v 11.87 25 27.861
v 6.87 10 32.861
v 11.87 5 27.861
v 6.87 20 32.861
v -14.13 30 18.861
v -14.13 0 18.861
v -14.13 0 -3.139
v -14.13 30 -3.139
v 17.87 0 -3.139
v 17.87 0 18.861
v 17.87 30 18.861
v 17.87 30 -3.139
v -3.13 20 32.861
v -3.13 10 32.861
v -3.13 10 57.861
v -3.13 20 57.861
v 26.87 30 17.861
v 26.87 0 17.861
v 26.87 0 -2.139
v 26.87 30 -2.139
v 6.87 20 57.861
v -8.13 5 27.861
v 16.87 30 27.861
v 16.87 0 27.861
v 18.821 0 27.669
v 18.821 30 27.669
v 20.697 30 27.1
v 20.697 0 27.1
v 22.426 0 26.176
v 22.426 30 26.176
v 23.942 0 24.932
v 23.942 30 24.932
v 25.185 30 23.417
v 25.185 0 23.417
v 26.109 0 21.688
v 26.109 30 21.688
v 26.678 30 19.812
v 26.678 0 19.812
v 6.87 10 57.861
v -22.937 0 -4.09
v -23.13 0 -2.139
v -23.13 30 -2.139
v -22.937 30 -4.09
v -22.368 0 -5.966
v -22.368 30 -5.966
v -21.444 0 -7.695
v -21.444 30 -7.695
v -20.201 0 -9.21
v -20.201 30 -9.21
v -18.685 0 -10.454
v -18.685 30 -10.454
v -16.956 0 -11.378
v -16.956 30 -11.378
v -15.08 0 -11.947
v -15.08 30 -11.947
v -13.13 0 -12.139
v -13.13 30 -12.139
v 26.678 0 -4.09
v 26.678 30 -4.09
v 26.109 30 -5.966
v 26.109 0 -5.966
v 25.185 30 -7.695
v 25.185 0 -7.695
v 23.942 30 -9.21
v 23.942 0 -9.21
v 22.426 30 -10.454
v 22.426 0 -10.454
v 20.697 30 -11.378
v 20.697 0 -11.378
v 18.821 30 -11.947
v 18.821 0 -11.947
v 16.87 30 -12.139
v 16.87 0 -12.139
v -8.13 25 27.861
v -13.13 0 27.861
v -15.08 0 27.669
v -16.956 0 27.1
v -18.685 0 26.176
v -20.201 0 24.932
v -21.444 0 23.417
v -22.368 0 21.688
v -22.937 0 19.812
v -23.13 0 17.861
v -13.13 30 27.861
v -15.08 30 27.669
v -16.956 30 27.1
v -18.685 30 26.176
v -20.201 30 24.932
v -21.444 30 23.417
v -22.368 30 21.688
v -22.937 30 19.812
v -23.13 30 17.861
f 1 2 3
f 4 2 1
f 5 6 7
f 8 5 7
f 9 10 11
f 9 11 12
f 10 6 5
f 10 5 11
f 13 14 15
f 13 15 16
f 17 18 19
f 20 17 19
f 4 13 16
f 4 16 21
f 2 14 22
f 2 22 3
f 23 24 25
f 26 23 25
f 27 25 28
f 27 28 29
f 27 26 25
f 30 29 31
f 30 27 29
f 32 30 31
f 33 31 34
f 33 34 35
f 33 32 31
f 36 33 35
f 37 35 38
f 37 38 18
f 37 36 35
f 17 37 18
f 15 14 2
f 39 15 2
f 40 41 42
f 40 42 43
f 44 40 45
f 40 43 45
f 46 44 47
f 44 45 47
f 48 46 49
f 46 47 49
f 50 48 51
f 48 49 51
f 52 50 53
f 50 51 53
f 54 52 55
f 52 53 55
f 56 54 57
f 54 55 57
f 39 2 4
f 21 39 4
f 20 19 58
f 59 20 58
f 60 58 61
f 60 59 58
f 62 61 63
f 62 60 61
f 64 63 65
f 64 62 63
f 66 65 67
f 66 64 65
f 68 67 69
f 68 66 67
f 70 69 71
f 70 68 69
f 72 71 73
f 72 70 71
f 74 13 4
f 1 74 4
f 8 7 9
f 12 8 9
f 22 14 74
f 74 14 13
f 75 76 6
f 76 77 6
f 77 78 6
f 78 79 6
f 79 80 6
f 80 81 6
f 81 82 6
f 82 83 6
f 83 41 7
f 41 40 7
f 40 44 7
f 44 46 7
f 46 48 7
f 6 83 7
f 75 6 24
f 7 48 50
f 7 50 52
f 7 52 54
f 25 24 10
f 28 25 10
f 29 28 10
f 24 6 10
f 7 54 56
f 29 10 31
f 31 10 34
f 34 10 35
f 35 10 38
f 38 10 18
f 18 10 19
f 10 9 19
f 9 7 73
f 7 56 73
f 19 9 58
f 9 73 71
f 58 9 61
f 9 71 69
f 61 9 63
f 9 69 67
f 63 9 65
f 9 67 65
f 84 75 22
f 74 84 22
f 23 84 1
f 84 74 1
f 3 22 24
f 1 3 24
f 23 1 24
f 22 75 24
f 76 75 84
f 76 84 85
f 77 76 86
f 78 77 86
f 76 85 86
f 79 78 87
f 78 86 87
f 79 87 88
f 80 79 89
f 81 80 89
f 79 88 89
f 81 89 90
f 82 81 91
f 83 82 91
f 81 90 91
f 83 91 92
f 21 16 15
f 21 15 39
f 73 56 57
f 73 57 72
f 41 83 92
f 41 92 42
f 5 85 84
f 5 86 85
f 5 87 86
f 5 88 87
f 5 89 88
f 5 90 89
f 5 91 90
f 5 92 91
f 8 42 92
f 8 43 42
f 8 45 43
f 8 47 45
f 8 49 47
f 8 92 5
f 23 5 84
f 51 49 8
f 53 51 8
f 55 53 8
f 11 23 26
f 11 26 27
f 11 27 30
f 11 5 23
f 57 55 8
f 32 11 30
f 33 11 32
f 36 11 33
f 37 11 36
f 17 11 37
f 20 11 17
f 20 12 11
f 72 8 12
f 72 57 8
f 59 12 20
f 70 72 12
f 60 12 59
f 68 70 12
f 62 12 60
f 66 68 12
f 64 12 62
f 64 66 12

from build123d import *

# Parameters (mm, degrees)
SKETCH1_W           = 50
SKETCH1_H           = 40
SKETCH1_W_2         = 32
SKETCH1_H_2         = 22
BOSS_EXTRUDE1_DEPTH = 30
SKETCH2_W           = 10
SKETCH2_H           = 10
BOSS_EXTRUDE2_DEPTH = 30
CHAMFER1_SIZE       = 5
FILLET1_R           = 10


with BuildPart() as part:
    # Sketch1 → Boss-Extrude1 (new body)
    with BuildSketch(Plane(origin=(0, 0, 0), x_dir=(1, 0, 0), z_dir=(0, 1, 0))):
        with Locations((1.8704784, -7.860892388)):
            Rectangle(SKETCH1_W, SKETCH1_H)
        with Locations((1.8704784, -7.860892388)):
            Rectangle(SKETCH1_W_2, SKETCH1_H_2, mode=Mode.SUBTRACT)
    extrude(amount=BOSS_EXTRUDE1_DEPTH)

    # Sketch2 → Boss-Extrude2 (add)
    with BuildSketch(Plane.XY.offset(27.860892388)):
        with Locations((1.8704784, 15)):
            Rectangle(SKETCH2_W, SKETCH2_H)
    extrude(amount=BOSS_EXTRUDE2_DEPTH)

    # Chamfer1
    chamfer1_edges = [part.edges().sort_by_distance(p)[0] for p in [
        (1.8704784, 10, 27.860892388),
        (6.8704784, 15, 27.860892388),
        (-3.1295216, 15, 27.860892388),
        (1.8704784, 20, 27.860892388),
    ]]
    chamfer(chamfer1_edges, length=CHAMFER1_SIZE)

    # Fillet1
    fillet1_edges = [part.edges().sort_by_distance(p)[0] for p in [
        (26.8704784, 15, 27.860892388),
        (-23.1295216, 15, 27.860892388),
        (-23.1295216, 15, -12.139107612),
        (26.8704784, 15, -12.139107612),
    ]]
    fillet(fillet1_edges, radius=FILLET1_R)


solid = part.part
